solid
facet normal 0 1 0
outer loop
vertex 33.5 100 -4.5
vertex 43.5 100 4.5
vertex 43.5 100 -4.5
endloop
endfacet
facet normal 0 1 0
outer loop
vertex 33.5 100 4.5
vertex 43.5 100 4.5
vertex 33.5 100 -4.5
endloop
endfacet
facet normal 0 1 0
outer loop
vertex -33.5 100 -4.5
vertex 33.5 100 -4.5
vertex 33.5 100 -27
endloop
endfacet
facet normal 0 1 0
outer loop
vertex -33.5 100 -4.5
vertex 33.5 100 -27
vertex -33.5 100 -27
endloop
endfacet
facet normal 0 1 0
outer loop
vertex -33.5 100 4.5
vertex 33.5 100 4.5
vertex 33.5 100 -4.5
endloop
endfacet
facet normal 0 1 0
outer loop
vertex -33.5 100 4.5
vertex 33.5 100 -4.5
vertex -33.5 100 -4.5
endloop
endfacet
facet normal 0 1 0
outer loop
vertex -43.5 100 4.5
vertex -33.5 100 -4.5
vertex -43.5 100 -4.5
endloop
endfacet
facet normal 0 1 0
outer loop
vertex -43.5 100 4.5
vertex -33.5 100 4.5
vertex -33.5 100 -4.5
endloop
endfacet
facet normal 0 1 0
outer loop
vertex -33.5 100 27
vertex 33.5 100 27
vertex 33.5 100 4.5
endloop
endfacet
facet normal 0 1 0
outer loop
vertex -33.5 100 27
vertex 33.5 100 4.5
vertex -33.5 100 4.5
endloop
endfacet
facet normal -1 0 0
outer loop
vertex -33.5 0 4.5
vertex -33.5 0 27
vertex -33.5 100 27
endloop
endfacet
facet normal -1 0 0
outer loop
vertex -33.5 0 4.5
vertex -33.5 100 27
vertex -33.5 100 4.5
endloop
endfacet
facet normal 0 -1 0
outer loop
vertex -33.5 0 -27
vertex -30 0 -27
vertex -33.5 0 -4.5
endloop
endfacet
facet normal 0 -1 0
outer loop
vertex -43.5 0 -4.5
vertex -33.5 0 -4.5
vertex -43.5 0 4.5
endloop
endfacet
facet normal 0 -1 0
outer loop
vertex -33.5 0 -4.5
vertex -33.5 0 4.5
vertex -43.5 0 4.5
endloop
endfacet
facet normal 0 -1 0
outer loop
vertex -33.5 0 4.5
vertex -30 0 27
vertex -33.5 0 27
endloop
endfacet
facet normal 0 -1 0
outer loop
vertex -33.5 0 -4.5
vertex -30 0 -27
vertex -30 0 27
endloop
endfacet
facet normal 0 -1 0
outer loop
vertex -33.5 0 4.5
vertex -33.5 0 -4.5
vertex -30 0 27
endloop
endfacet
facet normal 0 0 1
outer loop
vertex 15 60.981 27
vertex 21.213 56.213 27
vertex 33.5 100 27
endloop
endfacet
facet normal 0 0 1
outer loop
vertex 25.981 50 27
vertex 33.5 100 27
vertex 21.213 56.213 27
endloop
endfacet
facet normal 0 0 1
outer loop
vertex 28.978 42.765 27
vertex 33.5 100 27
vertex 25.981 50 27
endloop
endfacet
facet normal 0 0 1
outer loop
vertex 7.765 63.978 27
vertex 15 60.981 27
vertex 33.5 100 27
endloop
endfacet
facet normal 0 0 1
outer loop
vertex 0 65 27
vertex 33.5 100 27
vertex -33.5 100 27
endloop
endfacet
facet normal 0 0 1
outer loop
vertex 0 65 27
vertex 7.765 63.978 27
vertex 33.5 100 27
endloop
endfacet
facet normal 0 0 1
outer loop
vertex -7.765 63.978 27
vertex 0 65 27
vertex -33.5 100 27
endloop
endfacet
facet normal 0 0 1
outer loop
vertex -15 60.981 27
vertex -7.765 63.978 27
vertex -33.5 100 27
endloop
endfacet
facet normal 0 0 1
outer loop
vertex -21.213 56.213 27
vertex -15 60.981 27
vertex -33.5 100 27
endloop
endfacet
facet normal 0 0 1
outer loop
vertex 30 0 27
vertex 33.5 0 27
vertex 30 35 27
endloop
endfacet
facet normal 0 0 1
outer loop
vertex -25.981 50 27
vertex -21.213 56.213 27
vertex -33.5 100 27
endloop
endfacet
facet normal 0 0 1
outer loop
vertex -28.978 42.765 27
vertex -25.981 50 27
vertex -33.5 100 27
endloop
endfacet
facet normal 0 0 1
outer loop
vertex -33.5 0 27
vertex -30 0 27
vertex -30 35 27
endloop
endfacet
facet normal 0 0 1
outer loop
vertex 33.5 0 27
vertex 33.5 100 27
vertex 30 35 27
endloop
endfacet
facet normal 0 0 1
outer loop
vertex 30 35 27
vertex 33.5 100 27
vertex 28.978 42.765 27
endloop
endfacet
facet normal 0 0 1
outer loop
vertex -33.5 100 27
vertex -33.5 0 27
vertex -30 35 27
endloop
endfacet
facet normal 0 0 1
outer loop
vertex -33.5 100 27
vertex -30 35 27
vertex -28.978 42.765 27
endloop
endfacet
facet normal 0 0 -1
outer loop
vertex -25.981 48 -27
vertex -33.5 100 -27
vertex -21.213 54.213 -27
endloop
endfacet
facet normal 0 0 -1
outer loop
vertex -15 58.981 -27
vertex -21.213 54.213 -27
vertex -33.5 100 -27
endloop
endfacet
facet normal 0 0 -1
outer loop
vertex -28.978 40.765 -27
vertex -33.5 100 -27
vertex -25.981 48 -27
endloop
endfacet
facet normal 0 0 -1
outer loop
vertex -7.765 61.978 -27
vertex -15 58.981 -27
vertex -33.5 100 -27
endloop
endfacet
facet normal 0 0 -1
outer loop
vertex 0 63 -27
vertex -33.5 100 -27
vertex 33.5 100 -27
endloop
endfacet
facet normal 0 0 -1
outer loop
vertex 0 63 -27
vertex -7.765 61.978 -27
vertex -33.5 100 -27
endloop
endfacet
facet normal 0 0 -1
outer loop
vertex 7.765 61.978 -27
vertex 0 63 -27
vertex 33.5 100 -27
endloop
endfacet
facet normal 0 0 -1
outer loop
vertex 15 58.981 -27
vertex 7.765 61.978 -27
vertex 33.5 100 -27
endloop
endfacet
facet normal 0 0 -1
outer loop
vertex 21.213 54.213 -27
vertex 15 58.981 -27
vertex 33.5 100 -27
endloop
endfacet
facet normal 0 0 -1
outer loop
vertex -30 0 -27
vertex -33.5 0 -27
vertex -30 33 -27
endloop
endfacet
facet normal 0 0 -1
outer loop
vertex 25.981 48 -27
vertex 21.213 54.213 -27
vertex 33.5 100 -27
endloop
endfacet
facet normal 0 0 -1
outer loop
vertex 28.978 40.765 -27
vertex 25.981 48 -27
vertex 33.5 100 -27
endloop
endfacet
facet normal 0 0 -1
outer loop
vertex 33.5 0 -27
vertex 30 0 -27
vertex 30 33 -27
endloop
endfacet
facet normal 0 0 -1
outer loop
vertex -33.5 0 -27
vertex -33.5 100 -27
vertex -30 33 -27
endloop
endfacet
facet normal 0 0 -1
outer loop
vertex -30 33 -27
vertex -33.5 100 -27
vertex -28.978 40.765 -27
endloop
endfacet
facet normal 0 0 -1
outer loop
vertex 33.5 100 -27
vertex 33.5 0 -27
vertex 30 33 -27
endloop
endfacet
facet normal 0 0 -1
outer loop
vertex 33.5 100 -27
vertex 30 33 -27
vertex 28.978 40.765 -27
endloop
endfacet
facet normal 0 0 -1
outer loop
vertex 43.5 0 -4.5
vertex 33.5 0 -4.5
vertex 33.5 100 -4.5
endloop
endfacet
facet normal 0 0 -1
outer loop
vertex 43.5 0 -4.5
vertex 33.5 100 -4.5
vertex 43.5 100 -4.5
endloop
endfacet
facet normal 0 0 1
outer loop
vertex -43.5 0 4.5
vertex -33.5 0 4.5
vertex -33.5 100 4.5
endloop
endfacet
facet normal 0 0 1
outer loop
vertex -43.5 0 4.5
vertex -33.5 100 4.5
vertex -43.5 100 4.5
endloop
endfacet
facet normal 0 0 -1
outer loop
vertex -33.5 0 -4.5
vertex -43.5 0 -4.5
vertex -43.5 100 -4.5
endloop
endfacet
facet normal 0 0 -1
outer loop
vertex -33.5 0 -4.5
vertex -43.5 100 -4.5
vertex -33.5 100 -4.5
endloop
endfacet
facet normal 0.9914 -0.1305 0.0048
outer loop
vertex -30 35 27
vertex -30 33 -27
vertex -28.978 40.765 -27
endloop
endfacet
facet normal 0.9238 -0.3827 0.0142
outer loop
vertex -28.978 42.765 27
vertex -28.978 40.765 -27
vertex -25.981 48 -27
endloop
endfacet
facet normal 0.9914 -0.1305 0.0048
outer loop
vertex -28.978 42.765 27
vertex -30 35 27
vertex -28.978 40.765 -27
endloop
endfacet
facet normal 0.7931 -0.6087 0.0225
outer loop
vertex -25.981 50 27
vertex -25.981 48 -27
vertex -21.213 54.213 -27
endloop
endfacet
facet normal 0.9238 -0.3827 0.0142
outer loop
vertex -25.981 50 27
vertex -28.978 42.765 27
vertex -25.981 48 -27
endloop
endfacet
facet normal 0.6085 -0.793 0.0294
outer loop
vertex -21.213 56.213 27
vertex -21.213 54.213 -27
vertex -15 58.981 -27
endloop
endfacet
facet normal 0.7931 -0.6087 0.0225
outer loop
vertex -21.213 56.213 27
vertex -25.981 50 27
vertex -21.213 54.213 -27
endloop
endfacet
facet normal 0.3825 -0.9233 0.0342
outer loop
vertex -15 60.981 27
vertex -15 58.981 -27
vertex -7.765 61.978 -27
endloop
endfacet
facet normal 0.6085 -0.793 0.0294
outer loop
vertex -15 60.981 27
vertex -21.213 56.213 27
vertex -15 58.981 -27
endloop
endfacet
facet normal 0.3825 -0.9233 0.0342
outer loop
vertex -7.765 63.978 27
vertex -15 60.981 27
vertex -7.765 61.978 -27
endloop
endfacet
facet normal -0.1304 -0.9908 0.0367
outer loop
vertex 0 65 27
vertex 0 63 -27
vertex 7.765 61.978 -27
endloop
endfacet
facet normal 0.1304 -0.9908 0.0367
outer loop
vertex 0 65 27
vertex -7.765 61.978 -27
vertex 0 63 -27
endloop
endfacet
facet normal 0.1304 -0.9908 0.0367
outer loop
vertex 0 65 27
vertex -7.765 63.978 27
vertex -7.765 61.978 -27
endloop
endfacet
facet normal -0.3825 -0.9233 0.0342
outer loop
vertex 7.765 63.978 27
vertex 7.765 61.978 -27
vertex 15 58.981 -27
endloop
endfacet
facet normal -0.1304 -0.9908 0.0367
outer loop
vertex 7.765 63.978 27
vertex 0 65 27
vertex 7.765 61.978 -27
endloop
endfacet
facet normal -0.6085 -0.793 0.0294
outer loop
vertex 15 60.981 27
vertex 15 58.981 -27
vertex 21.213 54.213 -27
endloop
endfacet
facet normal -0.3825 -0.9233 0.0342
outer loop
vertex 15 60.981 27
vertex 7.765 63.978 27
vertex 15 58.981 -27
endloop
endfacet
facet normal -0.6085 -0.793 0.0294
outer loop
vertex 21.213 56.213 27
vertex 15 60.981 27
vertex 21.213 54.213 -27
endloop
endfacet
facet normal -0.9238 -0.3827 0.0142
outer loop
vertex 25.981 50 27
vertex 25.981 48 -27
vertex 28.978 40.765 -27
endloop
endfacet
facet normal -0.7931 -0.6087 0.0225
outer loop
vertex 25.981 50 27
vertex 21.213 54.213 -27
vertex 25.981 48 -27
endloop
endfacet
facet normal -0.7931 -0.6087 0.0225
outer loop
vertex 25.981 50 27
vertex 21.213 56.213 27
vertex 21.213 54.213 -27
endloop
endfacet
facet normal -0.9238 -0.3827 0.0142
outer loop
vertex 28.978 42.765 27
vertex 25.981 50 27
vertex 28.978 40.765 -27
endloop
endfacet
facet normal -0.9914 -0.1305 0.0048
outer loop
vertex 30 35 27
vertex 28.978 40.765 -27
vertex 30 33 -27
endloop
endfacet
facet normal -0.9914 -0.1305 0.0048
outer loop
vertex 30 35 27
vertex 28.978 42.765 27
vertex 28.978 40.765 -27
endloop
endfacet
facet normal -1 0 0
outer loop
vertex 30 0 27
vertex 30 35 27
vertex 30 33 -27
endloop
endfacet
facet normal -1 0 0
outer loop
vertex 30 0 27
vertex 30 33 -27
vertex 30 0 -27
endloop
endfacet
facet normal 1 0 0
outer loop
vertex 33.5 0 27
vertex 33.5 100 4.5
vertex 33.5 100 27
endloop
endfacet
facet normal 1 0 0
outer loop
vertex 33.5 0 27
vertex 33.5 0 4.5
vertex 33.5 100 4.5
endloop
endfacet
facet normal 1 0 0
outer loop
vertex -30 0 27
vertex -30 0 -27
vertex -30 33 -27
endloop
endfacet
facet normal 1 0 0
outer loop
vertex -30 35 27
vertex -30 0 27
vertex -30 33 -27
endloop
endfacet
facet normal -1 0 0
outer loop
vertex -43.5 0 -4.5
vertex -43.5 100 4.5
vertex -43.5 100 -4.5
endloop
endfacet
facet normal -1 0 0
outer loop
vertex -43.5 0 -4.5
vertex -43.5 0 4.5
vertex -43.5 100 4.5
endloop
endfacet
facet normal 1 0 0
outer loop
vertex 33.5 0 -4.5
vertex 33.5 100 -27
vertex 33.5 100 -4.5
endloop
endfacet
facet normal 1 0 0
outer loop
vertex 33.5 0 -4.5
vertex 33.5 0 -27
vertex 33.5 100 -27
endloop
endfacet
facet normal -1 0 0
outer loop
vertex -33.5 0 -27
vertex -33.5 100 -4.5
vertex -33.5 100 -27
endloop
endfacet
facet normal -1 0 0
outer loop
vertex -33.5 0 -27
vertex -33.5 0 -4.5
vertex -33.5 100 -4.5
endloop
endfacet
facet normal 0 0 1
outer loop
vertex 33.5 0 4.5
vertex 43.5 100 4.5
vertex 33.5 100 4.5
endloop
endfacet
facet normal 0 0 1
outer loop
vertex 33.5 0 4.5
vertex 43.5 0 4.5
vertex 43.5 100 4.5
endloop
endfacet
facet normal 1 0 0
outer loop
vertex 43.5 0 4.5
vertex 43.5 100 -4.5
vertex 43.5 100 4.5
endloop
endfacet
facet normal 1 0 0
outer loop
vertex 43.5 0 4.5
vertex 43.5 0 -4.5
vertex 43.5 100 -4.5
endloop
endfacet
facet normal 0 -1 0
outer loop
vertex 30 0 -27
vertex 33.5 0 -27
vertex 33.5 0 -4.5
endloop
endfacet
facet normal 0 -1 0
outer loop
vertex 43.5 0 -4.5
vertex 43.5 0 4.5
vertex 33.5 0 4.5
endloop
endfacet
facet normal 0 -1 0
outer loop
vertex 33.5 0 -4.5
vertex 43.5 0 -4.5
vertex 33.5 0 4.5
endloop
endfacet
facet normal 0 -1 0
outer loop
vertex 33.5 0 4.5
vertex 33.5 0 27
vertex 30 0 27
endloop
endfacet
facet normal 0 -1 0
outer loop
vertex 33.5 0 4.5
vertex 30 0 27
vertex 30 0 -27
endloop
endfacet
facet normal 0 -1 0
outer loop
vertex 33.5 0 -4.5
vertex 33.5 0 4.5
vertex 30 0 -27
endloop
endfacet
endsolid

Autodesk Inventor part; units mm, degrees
ref_plane "YZ Plane" through (0, 0, 0) normal (1, 0, 0) x (0, 1, 0)
ref_plane "XZ Plane" through (0, 0, 0) normal (0, 1, 0) x (-1, 0, 0)
ref_plane "XY Plane" through (0, 0, 0) normal (0, 0, 1) x (1, 0, 0)
sketch "草圖1" plane through (0, 0, 0) normal (0, 1, 0) x (-1, 0, 0)
  line L0 (-33.5, 27) -> (33.5, 27)
  line L1 (33.5, 27) -> (33.5, -27)
  line L2 (33.5, -27) -> (-33.5, -27)
  line L3 (-33.5, -27) -> (-33.5, 27)
  line L4 (-33.5, 27) -> (33.5, -27) construction
  line L5 (33.5, 27) -> (-33.5, -27) construction
  line L6 (43.5, -4.5) -> (33.5, -4.5)
  line L7 (33.5, -4.5) -> (33.5, 4.5)
  line L8 (33.5, 4.5) -> (43.5, 4.5)
  line L9 (43.5, 4.5) -> (43.5, -4.5)
  line L10 (-33.5, -4.5) -> (-43.5, -4.5)
  line L11 (-43.5, -4.5) -> (-43.5, 4.5)
  line L12 (-43.5, 4.5) -> (-33.5, 4.5)
  line L13 (-33.5, 4.5) -> (-33.5, -4.5)
  point P0 (0, 0)
  point P1 (33.5, 0)
  point P2 (-33.5, 0)
  point P3 (-33.5, 4.5)
  point P4 (-33.5, -4.5)
  dimension "d0" = 67
  dimension "d1" = 54
  dimension "d2" = 9
  dimension "d3" = 10
extrude "擠出1" add sketch "草圖1" along normal blind 100
sketch "草圖2" plane through (-33.5, 0, 27) normal (0, 0, 1) x (1, 0, 0)
  circle A0 centre (33.5, 33) radius 30
  line L0 (0, 0) -> (67, 0) projected
  line L1 (3.5, 33) -> (63.5, 33)
  line L2 (63.5, 33) -> (63.5, -12.4903)
  line L3 (63.5, -12.4903) -> (3.5, -12.4903)
  line L4 (3.5, -12.4903) -> (3.5, 33)
  point P0 (33.5, 0)
  point P1 (33.5, 0)
  point P2 (63.5, 33)
  dimension "d6" = 33
  dimension "d7" = 60
extrude "擠出2" cut sketch "草圖2" against normal through all
sketch "草圖3" plane through (33.5, 100, -27) normal (0, 0, -1) x (-1, 0, 0)
  line L0 (3.5, -100) -> (3.5, -67) projected
  arc A0 (63.5, -67) -> (3.5, -67) centre (33.5, -67) ccw projected
  line L1 (63.5, -67) -> (63.5, -100) projected
  line L2 (63.5, -100) -> (67, -100) projected
  line L3 (67, -100) -> (67, 0) projected
  line L4 (0, 0) -> (67, 0) projected
  line L5 (0, -100) -> (0, 0) projected
  line L6 (0, -100) -> (3.5, -100) projected
  line L7 (63.5, -67) -> (63.5, -100) projected
  line L8 (63.5, -100) -> (3.5, -100)
  point P0 (33.5, -100)
sketch "草圖4" plane through (-33.5, 100, 27) normal (0, 0, 1) x (1, 0, 0)
  circle A0 centre (33.5, -65) radius 30
  arc A1 (63.5, -67) -> (3.5, -67) centre (33.5, -67) ccw construction
  line L0 (63.5, -100) -> (3.5, -100)
  line L1 (3.5, -100) -> (3.5, -65)
  line L2 (3.5, -65) -> (63.5, -65)
  line L3 (63.5, -65) -> (63.5, -100)
  point P0 (33.5, -100)
  dimension "d10" = 60
  dimension "d11" = 2
loft "斷面混成1" cut profiles "草圖3", "草圖4" contours L0 A0 L1 L8 / all
properties part number "Slider-1"
